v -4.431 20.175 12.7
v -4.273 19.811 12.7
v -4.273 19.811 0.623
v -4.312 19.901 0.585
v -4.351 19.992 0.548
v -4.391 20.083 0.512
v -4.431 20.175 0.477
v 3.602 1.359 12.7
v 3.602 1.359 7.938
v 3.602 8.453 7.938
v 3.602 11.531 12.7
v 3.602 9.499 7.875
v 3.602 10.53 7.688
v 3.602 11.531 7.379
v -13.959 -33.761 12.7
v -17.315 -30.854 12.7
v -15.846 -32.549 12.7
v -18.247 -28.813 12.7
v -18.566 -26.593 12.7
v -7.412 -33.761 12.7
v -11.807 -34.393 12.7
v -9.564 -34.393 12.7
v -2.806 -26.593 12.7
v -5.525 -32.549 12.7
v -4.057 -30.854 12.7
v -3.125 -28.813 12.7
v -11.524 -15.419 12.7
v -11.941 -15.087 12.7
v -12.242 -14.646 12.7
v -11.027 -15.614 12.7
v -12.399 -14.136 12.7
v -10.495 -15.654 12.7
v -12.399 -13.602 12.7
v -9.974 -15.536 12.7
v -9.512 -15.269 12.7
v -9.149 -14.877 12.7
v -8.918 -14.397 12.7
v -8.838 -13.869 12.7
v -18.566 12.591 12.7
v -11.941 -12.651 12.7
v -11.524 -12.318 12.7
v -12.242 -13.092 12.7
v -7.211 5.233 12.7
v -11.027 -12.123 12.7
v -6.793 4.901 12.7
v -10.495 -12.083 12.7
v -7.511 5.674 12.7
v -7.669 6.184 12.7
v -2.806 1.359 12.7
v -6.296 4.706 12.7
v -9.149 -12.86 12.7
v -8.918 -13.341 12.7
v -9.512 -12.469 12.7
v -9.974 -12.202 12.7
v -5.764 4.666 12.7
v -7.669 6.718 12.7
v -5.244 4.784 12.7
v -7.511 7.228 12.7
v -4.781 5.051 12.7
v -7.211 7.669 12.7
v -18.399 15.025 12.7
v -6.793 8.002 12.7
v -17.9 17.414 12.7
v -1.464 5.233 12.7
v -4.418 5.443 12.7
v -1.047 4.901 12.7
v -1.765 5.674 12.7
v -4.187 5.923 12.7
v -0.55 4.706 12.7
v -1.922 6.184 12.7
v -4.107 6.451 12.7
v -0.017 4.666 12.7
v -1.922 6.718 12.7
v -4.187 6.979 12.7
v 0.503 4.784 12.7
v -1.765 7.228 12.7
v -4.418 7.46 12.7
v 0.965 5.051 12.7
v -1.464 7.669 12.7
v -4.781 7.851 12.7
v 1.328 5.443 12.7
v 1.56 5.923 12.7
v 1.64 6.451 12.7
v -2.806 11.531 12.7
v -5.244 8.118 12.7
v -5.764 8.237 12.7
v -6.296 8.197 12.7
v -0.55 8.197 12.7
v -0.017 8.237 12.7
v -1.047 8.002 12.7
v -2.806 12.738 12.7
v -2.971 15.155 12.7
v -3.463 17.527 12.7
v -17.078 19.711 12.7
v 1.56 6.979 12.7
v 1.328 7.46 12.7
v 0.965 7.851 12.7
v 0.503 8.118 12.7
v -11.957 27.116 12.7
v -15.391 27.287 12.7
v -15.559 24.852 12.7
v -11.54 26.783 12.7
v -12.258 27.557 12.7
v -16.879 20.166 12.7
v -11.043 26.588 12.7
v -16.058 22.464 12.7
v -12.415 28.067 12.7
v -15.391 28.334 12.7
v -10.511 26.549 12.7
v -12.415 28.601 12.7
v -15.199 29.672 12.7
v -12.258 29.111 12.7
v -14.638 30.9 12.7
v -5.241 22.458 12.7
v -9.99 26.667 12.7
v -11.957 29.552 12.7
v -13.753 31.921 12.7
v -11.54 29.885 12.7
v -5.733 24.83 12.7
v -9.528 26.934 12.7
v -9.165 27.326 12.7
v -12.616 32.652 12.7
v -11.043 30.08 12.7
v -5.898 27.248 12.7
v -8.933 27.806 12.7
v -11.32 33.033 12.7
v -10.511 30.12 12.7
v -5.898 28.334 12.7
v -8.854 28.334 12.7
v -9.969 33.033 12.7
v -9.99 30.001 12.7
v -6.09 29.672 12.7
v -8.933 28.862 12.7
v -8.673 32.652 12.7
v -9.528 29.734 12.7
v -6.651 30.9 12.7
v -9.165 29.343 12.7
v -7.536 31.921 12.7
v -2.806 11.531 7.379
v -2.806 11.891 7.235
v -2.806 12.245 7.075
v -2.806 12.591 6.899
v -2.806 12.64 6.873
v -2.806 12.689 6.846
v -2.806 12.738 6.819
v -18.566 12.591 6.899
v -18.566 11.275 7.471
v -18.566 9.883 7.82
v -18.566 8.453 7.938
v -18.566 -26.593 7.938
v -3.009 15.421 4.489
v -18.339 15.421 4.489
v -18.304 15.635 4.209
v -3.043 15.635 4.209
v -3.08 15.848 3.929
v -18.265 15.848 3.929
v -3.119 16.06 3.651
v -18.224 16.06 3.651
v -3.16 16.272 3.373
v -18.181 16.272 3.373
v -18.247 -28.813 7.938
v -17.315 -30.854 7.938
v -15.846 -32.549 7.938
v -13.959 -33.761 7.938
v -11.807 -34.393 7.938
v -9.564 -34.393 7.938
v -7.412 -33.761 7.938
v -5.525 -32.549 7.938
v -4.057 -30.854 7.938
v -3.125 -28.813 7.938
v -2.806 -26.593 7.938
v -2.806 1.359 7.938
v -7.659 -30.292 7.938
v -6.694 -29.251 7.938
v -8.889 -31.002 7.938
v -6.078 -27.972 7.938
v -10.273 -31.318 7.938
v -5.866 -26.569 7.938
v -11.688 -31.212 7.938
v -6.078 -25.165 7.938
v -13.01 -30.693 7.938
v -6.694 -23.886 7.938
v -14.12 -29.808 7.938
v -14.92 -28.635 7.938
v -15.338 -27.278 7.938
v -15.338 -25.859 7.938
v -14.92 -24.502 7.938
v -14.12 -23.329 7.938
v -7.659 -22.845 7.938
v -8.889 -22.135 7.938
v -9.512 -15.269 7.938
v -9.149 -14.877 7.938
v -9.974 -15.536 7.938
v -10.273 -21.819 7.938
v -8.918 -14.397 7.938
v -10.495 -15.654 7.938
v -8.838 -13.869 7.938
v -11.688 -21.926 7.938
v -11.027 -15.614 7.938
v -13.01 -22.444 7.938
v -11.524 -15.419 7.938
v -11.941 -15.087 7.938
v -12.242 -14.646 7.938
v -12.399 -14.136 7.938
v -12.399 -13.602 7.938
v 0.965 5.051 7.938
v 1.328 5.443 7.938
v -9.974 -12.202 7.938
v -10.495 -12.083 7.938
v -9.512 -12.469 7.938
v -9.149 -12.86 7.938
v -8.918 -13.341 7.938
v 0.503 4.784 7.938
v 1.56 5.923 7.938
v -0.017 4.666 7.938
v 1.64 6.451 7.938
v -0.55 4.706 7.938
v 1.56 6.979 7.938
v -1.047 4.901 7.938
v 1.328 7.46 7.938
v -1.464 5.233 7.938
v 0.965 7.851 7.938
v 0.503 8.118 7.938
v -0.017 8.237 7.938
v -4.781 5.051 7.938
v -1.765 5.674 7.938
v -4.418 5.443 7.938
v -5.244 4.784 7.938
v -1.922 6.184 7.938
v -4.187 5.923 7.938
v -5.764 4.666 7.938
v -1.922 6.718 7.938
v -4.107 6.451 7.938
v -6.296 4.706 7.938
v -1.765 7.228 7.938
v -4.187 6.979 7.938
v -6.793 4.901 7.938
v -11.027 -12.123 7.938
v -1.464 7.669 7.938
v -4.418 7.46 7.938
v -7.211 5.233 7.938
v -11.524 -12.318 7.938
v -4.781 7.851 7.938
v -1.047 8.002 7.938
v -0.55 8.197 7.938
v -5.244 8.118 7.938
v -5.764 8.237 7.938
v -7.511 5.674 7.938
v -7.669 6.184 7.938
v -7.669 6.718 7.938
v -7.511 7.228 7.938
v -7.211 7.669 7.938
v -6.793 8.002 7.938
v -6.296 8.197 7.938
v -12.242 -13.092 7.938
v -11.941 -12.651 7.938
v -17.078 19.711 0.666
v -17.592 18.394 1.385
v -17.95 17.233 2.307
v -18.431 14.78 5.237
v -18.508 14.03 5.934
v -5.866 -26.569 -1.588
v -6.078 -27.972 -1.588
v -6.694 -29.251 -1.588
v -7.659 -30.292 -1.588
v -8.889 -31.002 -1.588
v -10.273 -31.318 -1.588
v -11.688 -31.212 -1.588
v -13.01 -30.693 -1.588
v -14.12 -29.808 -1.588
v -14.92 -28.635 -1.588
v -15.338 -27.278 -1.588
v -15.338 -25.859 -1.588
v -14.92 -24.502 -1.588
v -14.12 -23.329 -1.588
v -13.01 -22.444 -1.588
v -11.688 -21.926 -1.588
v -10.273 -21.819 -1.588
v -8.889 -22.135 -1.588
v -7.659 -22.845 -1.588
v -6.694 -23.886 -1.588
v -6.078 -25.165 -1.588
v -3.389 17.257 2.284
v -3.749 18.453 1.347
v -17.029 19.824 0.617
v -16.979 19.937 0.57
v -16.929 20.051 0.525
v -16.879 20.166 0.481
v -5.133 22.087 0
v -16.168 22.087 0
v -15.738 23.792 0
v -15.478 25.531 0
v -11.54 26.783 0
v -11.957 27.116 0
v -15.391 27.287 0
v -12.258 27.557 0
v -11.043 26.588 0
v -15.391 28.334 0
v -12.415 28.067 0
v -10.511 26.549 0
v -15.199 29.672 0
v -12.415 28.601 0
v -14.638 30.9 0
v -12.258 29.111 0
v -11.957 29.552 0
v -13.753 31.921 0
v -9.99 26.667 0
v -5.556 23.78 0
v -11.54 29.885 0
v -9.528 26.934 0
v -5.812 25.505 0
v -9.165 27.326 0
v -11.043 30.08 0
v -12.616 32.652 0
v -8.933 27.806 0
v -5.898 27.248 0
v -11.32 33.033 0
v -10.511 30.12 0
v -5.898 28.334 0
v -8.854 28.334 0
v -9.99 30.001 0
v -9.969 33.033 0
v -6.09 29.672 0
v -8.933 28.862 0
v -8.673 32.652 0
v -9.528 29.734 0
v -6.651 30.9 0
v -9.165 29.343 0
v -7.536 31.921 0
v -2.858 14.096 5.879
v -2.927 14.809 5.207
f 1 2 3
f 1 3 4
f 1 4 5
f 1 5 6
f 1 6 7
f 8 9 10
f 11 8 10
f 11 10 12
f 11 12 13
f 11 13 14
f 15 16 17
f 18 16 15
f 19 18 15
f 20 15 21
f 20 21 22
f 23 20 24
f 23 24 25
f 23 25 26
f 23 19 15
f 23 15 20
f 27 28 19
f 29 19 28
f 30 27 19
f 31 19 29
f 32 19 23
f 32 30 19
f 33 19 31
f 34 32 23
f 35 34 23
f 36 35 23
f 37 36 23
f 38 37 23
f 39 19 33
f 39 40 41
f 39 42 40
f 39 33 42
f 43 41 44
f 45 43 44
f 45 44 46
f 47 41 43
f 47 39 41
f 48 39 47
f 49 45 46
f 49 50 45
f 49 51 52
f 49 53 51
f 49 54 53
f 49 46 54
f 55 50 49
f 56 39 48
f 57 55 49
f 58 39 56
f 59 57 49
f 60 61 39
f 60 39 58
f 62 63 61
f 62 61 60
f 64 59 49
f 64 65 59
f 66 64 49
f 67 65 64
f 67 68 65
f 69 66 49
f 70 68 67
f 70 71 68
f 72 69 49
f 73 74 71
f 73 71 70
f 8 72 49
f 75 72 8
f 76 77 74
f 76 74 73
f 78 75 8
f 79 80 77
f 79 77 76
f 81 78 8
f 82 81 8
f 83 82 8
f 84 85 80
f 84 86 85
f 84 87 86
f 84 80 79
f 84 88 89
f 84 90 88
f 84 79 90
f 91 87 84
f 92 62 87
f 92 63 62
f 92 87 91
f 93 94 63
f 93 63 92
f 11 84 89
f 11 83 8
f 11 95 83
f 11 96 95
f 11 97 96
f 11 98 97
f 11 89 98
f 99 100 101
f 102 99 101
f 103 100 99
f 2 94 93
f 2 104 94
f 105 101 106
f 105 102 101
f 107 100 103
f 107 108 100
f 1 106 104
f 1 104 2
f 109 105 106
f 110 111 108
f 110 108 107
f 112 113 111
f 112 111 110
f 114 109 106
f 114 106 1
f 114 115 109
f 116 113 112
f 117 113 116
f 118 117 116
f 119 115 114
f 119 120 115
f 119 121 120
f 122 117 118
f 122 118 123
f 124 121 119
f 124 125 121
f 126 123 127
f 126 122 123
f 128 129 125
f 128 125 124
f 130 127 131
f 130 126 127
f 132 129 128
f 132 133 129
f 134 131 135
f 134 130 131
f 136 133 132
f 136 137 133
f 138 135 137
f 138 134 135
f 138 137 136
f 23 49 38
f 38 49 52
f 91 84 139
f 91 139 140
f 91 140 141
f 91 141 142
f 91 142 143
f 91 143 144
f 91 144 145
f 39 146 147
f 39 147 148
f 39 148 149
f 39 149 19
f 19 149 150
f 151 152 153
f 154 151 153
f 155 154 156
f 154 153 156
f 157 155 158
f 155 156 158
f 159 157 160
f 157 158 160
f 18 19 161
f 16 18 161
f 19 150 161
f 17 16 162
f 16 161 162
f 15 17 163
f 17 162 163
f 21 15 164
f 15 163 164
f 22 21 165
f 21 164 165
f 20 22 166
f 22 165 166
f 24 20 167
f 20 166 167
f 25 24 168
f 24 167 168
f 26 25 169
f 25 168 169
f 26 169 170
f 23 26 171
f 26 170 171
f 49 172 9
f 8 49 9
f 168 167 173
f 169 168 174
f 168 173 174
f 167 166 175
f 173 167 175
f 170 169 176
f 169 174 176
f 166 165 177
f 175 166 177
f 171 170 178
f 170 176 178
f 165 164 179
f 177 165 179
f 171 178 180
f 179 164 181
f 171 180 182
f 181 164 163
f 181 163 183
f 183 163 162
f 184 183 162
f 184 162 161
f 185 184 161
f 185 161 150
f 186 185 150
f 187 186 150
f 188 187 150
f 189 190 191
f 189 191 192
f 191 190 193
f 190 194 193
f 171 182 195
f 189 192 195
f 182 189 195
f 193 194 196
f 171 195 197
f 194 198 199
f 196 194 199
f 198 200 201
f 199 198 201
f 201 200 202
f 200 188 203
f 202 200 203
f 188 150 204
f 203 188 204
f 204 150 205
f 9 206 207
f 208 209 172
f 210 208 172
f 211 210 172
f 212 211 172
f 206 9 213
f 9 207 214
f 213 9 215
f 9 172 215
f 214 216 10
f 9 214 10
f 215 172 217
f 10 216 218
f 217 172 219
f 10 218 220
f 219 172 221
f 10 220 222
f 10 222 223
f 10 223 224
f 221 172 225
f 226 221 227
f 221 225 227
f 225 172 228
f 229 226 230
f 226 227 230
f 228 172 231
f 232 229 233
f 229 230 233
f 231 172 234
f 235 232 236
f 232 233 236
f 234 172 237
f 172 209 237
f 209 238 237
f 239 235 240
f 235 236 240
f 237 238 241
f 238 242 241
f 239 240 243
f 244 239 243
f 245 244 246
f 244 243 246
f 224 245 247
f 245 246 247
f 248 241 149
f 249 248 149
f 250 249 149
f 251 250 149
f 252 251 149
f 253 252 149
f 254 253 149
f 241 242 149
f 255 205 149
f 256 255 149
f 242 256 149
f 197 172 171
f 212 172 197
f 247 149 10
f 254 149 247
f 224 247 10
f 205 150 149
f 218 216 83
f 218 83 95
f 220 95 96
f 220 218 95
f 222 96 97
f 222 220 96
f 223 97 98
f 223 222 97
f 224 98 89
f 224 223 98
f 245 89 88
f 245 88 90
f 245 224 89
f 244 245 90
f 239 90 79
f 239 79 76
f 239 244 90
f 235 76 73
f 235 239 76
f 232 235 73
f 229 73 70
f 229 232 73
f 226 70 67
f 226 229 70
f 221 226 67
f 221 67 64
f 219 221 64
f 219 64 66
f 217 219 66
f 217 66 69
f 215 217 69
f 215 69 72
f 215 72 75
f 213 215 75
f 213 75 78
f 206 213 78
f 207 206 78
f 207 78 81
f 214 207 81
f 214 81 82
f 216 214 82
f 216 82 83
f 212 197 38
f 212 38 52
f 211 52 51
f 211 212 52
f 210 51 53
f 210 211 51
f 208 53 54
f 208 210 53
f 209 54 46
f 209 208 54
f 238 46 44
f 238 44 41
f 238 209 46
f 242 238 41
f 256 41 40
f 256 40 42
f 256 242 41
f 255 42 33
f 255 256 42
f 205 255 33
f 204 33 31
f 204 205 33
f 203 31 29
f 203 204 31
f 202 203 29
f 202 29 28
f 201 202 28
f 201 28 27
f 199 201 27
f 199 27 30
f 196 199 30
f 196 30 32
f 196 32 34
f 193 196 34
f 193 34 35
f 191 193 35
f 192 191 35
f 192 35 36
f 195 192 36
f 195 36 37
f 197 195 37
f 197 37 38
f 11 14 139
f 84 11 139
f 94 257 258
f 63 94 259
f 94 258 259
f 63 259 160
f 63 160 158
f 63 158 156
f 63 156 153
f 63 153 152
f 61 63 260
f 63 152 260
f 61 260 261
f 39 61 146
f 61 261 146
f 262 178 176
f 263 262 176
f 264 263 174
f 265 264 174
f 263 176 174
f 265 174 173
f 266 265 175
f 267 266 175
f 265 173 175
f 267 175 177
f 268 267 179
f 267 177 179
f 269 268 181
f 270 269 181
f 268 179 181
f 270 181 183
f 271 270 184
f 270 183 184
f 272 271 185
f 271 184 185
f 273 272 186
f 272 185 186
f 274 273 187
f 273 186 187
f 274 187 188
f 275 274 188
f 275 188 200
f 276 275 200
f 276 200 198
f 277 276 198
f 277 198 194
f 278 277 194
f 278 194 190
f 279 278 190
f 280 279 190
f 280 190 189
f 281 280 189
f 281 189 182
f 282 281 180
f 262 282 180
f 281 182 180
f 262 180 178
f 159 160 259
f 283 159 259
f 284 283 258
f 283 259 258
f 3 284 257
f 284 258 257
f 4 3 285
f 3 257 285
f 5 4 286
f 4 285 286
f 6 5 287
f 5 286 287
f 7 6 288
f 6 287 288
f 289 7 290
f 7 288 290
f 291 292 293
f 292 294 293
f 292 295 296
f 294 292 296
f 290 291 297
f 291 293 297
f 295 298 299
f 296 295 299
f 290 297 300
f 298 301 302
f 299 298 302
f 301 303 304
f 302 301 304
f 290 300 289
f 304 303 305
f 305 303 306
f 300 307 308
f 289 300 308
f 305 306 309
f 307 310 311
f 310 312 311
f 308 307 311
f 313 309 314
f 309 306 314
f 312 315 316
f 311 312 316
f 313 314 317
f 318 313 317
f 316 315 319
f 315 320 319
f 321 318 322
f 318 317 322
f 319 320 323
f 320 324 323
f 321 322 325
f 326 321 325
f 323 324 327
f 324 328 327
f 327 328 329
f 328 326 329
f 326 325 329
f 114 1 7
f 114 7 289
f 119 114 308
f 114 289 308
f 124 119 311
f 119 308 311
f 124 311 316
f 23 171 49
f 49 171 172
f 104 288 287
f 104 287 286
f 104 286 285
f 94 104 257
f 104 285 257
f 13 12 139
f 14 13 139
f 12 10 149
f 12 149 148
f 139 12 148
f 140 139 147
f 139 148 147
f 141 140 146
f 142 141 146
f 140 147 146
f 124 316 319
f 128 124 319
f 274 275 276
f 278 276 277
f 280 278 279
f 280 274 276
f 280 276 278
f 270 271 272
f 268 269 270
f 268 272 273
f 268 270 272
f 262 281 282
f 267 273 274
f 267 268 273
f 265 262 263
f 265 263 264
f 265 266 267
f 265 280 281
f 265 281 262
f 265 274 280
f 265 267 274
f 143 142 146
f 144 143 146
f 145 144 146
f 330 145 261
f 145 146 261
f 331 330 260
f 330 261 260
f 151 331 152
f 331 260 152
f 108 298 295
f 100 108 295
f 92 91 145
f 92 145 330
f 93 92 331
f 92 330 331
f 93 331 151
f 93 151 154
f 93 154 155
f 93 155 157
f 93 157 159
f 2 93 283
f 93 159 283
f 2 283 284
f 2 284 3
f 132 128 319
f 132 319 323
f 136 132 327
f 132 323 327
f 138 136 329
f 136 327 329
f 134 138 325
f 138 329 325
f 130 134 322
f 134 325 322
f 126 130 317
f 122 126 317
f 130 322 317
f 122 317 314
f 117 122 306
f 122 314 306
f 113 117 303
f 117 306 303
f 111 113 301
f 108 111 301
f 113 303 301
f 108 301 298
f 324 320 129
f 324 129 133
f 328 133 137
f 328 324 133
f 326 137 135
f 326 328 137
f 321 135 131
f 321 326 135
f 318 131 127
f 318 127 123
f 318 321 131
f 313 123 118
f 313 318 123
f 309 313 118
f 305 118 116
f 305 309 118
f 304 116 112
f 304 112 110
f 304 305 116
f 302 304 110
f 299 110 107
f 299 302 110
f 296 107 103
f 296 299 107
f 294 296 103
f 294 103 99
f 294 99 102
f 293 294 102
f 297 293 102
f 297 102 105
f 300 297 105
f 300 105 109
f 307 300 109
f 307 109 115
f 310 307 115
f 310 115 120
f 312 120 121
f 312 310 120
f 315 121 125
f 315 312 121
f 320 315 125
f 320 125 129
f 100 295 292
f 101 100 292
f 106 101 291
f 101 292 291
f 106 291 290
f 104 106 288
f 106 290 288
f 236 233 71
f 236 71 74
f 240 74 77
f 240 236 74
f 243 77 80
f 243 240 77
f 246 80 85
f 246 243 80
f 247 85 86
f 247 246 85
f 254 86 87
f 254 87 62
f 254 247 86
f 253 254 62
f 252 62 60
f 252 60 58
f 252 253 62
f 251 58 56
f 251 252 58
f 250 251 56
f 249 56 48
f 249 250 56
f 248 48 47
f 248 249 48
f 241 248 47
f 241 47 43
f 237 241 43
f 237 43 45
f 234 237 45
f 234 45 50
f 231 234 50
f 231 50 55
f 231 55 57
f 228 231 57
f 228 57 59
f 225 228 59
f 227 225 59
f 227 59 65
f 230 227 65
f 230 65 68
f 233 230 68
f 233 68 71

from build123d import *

# Parameters (mm, degrees)
SKETCH1_R           = 1.7907
BOSS_EXTRUDE1_DEPTH = 12.7
CUT_EXTRUDE1_DEPTH  = 43.908371508
SKETCH7_R           = 4.7625
BOSS_EXTRUDE3_DEPTH = 9.525


with BuildPart() as part:
    # Sketch1 → Boss-Extrude1 (new body)
    with BuildSketch(Plane.XY):
        with BuildLine():
            ThreePointArc((-5.89797239, 28.334249775), (-10.644578231, 33.080855616), (-15.391184073, 28.334249775))
            Line((-15.391184073, 28.334249775), (-15.391184073, 27.2867057))
            ThreePointArc((-15.391184073, 27.2867057), (-15.767187067, 23.64949685), (-16.879292984, 20.16612393))
            Line((-16.879292984, 20.16612393), (-17.078075162, 19.711310306))
            ThreePointArc((-17.078075162, 19.711310306), (-18.190181079, 16.227937386), (-18.566184073, 12.590728536))
            Line((-18.566184073, 12.590728536), (-18.566184073, -26.593250225))
            ThreePointArc((-18.566184073, -26.593250225), (-10.68587239, -34.473561908), (-2.805560707, -26.593250225))
            Line((-2.805560707, -26.593250225), (-2.805560707, 1.359449775))
            Line((-2.805560707, 1.359449775), (3.60162761, 1.359449775))
            Line((3.60162761, 1.359449775), (3.60162761, 11.531317118))
            Line((3.60162761, 11.531317118), (-2.805560707, 11.531317118))
            Line((-2.805560707, 11.531317118), (-2.805560707, 12.738028185))
            ThreePointArc((-2.805560707, 12.738028185), (-3.176236758, 16.349653807), (-4.272809259, 19.810689652))
            Line((-4.272809259, 19.810689652), (-4.430723837, 20.174911983))
            ThreePointArc((-4.430723837, 20.174911983), (-5.527296339, 23.635947828), (-5.89797239, 27.24757345))
            Line((-5.89797239, 27.24757345), (-5.89797239, 28.334249775))
        make_face()
        with Locations((-10.644578231, 28.334249775)):
            Circle(SKETCH1_R, mode=Mode.SUBTRACT)
        with Locations((-0.151184073, 6.451317118)):
            Circle(SKETCH1_R, mode=Mode.SUBTRACT)
        with Locations((-10.628684073, -13.868682882)):
            Circle(SKETCH1_R, mode=Mode.SUBTRACT)
        with Locations((-5.89797239, 6.451317118)):
            Circle(SKETCH1_R, mode=Mode.SUBTRACT)
    extrude(amount=BOSS_EXTRUDE1_DEPTH)

    # Sketch5 → Cut-Extrude1 (cut, through all)
    with BuildSketch(Plane.ZY.offset(18.566184073)):
        with BuildLine():
            ThreePointArc((7.9375, 8.453324113), (7.028090228, 12.340648325), (4.488615022, 15.421132271))
            Line((4.488615022, 15.421132271), (3.372744888, 16.272169226))
            ThreePointArc((3.372744888, 16.272169226), (1.106569634, 18.843459634), (0, 22.08731356))
            Line((0, 22.08731356), (0, -34.473561908))
            Line((0, -34.473561908), (7.9375, -34.473561908))
            Line((7.9375, -34.473561908), (7.9375, 8.453324113))
        make_face()
    extrude(amount=-CUT_EXTRUDE1_DEPTH, mode=Mode.SUBTRACT)

    # Sketch7 → Boss-Extrude3 (add)
    with BuildSketch(Plane(origin=(0, 0, 7.9375), x_dir=(-1, 0, 0), z_dir=(0, 0, -1))):
        with Locations((10.628684073, -26.568682882)):
            Circle(SKETCH7_R)
    extrude(amount=BOSS_EXTRUDE3_DEPTH)


solid = part.part
